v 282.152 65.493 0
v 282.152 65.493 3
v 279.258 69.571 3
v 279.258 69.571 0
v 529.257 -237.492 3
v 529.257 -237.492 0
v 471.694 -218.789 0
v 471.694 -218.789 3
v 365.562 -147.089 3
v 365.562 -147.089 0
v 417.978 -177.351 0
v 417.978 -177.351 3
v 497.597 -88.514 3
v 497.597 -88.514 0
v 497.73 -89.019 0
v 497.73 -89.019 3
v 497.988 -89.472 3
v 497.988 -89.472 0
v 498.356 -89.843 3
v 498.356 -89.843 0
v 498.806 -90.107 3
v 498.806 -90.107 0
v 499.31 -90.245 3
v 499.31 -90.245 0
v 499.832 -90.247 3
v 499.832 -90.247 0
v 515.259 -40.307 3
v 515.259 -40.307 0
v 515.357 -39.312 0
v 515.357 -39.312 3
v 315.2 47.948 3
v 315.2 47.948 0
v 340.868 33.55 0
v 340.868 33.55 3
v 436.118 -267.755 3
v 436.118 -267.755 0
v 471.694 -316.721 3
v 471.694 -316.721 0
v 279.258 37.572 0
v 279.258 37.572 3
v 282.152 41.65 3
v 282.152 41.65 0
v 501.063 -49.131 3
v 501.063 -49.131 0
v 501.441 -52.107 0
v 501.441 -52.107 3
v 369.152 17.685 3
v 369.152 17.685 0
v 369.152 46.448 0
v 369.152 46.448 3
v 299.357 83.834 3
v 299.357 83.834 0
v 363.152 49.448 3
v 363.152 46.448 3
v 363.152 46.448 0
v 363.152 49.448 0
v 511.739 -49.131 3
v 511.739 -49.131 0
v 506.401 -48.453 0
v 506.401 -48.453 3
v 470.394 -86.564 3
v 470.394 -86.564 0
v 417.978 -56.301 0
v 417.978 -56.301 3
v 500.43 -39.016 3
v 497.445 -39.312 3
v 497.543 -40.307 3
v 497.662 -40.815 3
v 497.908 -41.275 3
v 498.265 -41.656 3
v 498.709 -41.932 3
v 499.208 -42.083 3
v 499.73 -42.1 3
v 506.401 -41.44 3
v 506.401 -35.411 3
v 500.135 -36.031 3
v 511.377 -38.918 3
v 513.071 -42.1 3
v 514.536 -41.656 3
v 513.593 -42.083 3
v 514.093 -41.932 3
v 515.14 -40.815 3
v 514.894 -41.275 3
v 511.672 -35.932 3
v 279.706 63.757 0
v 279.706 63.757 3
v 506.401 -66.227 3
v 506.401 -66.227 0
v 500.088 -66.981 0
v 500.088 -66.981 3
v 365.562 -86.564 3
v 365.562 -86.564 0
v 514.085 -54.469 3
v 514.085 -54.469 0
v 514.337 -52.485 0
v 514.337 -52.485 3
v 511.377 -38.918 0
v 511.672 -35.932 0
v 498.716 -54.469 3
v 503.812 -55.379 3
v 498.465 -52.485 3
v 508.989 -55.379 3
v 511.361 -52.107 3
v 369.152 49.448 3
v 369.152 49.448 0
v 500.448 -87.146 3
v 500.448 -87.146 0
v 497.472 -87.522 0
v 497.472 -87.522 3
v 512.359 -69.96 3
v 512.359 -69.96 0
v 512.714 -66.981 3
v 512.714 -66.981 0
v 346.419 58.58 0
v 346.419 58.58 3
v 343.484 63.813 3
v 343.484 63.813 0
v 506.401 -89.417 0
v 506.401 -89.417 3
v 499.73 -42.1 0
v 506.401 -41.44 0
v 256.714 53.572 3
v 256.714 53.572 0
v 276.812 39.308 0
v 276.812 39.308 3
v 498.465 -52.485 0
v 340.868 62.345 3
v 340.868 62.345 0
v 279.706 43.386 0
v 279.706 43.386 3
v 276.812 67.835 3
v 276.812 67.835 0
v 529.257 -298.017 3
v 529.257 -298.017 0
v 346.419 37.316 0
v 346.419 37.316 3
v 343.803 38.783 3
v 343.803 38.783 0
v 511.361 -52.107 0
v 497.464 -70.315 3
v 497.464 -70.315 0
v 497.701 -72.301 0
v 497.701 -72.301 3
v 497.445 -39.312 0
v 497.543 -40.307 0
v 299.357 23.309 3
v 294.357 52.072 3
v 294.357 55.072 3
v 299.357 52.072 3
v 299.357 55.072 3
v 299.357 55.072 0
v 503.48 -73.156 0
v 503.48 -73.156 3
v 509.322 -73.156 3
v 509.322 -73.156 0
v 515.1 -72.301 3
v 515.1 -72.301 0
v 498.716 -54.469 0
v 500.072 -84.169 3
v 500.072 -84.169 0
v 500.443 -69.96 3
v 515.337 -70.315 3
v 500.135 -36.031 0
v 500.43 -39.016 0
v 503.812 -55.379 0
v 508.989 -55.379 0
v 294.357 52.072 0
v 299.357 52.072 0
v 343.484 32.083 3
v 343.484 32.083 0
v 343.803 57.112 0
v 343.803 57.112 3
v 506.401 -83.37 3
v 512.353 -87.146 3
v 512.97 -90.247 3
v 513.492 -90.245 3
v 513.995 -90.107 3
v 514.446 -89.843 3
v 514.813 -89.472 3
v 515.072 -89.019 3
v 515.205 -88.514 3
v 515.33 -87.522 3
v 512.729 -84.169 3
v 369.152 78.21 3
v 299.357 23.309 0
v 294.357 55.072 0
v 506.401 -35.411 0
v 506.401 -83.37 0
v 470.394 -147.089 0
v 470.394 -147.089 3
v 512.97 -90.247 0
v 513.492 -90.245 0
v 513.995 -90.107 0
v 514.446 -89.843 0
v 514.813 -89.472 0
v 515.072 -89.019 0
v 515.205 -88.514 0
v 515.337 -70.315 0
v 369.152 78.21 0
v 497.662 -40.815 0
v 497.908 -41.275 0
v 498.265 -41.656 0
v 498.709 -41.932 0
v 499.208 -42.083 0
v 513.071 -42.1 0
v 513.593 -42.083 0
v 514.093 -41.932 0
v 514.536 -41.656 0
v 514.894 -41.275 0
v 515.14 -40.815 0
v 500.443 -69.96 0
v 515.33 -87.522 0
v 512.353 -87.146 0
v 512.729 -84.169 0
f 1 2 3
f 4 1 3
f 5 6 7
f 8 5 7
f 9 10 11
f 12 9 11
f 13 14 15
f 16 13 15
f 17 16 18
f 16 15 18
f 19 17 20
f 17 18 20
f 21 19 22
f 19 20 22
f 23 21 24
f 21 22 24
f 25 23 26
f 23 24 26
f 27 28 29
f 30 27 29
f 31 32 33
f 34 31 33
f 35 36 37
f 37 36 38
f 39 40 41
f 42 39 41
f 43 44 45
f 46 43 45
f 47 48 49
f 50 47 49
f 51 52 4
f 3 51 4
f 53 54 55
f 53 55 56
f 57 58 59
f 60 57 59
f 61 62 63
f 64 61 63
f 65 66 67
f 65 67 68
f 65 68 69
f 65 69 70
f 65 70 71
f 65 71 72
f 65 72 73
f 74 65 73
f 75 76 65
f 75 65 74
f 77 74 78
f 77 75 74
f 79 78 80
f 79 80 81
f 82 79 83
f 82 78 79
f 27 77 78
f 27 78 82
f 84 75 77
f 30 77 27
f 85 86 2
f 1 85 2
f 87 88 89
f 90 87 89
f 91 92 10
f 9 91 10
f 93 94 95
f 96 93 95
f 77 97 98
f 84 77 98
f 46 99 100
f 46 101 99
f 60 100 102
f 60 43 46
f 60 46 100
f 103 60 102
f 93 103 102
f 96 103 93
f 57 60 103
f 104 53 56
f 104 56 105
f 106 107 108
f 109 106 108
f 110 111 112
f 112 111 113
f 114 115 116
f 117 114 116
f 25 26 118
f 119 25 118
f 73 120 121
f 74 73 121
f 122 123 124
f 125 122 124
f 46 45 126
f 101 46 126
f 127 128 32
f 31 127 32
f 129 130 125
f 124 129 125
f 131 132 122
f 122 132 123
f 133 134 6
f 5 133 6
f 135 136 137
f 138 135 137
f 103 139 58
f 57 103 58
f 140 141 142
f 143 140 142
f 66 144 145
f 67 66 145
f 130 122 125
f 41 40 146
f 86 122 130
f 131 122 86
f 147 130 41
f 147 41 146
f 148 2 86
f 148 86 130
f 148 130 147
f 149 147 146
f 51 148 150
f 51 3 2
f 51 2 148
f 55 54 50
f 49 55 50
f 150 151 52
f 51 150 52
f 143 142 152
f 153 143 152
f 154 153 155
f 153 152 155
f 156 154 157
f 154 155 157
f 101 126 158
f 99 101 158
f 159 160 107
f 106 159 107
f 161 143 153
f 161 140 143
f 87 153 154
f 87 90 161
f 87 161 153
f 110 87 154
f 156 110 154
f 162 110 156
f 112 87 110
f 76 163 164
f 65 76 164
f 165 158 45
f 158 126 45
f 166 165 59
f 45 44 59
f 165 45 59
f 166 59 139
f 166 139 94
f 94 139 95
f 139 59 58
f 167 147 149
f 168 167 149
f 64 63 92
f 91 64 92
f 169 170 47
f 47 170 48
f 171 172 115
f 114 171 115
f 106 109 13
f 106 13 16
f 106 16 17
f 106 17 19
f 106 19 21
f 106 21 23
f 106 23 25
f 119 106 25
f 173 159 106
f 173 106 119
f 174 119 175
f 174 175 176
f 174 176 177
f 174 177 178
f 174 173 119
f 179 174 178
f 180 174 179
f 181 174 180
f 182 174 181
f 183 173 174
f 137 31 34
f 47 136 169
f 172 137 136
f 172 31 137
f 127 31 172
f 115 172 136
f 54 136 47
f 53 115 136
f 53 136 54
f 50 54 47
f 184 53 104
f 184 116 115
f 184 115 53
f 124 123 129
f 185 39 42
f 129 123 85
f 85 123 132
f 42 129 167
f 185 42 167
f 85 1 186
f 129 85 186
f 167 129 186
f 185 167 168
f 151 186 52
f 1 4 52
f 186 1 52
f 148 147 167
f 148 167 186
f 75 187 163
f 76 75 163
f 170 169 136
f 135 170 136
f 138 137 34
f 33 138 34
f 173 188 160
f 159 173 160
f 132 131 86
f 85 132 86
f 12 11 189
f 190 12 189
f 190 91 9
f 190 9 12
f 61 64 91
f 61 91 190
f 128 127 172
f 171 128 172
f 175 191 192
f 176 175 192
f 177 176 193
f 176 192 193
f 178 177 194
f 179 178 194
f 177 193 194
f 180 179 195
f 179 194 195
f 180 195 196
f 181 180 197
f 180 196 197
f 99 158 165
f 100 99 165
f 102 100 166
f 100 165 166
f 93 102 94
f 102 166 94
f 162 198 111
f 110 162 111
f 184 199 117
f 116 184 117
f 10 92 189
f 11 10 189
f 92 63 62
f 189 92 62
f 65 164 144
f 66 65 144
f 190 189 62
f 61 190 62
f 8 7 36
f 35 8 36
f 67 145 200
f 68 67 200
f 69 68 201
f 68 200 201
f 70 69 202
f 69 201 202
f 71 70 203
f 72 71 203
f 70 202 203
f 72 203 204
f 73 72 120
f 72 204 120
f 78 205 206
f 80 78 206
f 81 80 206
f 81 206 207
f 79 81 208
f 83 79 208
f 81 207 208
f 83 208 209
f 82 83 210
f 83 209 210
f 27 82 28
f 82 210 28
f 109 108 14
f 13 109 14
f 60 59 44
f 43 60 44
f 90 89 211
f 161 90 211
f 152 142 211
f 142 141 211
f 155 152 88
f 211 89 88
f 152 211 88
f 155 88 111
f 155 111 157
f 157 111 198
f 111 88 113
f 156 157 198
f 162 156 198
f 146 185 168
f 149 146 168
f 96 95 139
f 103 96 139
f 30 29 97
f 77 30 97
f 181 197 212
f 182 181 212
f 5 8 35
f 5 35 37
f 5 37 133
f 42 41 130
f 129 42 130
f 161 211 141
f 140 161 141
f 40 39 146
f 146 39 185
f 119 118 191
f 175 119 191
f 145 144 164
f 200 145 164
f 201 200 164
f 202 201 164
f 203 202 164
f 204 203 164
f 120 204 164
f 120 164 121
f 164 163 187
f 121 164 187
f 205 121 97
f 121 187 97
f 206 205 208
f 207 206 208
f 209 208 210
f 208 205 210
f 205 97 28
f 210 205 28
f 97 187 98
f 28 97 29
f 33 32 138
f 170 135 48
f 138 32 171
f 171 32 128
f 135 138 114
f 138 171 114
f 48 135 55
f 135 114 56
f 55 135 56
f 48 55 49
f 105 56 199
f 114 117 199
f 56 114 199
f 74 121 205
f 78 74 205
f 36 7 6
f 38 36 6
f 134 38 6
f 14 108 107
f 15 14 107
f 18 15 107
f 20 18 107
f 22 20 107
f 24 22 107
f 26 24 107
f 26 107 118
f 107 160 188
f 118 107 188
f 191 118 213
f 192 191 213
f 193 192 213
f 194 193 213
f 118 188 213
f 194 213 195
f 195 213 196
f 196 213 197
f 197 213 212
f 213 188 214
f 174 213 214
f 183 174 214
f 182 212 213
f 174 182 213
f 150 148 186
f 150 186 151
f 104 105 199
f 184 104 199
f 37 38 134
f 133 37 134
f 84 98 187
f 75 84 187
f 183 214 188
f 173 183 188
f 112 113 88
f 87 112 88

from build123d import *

# Parameters (mm, degrees)
F4_DEPTH = 3
F5_W     = 5
F5_H     = 3
F5_W_2   = 6
F6_DEPTH = 25


with BuildPart() as f4:
    # F3 (on Top) → F4 (new body)
    with BuildSketch(Plane.XY):
        Polygon((470.3941613828, -147.0885653714), (470.3941613828, -86.5635653714), (417.9779738188, -56.3010653714), (365.5617862547, -86.5635653714), (365.5617862547, -147.0885653714), (417.9779738188, -177.3510653714), align=None)
    extrude(amount=F4_DEPTH)


with BuildPart() as f4b:
    # F3 (on Top) → F4, piece 2 (new body)
    with BuildSketch(Plane.XY):
        Polygon((529.2567662146, -298.0174807028), (529.2567662146, -237.4924807028), (471.6940705658, -218.7892271182), (436.1183681708, -267.7549807028), (471.6940705658, -316.7207342873), align=None)
    extrude(amount=F4_DEPTH)


with BuildPart() as f4c:
    # F3 (on Top) → F4, piece 3 (new body)
    with BuildSketch(Plane.XY):
        Polygon((256.7136692096, 53.5715939384), (299.3566662168, 23.3090939384), (299.3566662168, 83.8340939384), align=None)
    extrude(amount=F4_DEPTH)


with BuildPart() as f4d:
    # F3 (on Top) → F4, piece 4 (new body)
    with BuildSketch(Plane.XY):
        Polygon((369.1518926518, 17.6854150152), (369.1518926518, 78.2104150152), (315.1996851552, 47.9479150152), align=None)
    extrude(amount=F4_DEPTH)


with BuildPart() as f4e:
    # F3 (on Top) → F4, piece 5 (new body)
    with BuildSketch(Plane.XY):
        with BuildLine():
            Line((499.7301674728, -42.1000808495), (506.4008064333, -41.4401412806))
            Line((506.4008064333, -41.4401412806), (513.0714453939, -42.1000808495))
            ThreePointArc((513.0714453939, -42.1000808495), (514.536459987, -41.6563714939), (515.2586318461, -40.3066998462))
            Line((515.2586318461, -40.3066998462), (515.3570832084, -39.3115579823))
            Line((515.3570832084, -39.3115579823), (511.3765157528, -38.9177525334))
            Line((511.3765157528, -38.9177525334), (511.6718698395, -35.9323269417))
            Line((511.6718698395, -35.9323269417), (506.4008064333, -35.4108501637))
            Line((506.4008064333, -35.4108501637), (500.1346011633, -36.0307783039))
            Line((500.1346011633, -36.0307783039), (500.42995525, -39.0162038956))
            Line((500.42995525, -39.0162038956), (497.4445296583, -39.3115579823))
            Line((497.4445296583, -39.3115579823), (497.5429810205, -40.3066998462))
            ThreePointArc((497.5429810205, -40.3066998462), (498.2651528796, -41.6563714939), (499.7301674728, -42.1000808495))
        make_face()
    extrude(amount=F4_DEPTH)


with BuildPart() as f4f:
    # F3 (on Top) → F4, piece 6 (new body)
    with BuildSketch(Plane.XY):
        with BuildLine():
            Line((514.0852315523, -54.4689418778), (506.4008064333, -53.4934037976))
            Line((506.4008064333, -53.4934037976), (498.7163813144, -54.4689418778))
            ThreePointArc((498.7163813144, -54.4689418778), (506.4008064333, -55.4934037976), (514.0852315523, -54.4689418778))
        make_face()
        Polygon((498.7163813144, -54.4689418778), (506.4008064333, -53.4934037976), (514.0852315523, -54.4689418778), (514.3371100693, -52.4848659688), (511.3609962058, -52.1070481933), (511.7388139814, -49.1309343298), (506.4008064333, -48.4532740552), (501.0627988853, -49.1309343298), (501.4406166609, -52.1070481933), (498.4645027974, -52.4848659688), align=None)
    extrude(amount=F4_DEPTH)


with BuildPart() as f4g:
    # F3 (on Top) → F4, piece 7 (new body)
    with BuildSketch(Plane.XY):
        with BuildLine():
            Line((515.1004217371, -72.3010336354), (506.4008064333, -71.2628973283))
            Line((506.4008064333, -71.2628973283), (497.7011911296, -72.3010336354))
            ThreePointArc((497.7011911296, -72.3010336354), (506.4008064333, -73.2628973283), (515.1004217371, -72.3010336354))
        make_face()
        Polygon((497.7011911296, -72.3010336354), (506.4008064333, -71.2628973283), (515.1004217371, -72.3010336354), (515.337402978, -70.3151232921), (512.3585374631, -69.9596514308), (512.7140093245, -66.9807859159), (506.4008064333, -66.2274232779), (500.0876035422, -66.9807859159), (500.4430754036, -69.9596514308), (497.4642098887, -70.3151232921), align=None)
    extrude(amount=F4_DEPTH)


with BuildPart() as f4h:
    # F3 (on Top) → F4, piece 8 (new body)
    with BuildSketch(Plane.XY):
        with BuildLine():
            Line((499.8320032248, -90.2472541053), (506.4008064333, -89.4174212789))
            Line((506.4008064333, -89.4174212789), (512.9696096418, -90.2472541053))
            ThreePointArc((512.9696096418, -90.2472541053), (514.4460902163, -89.8433347274), (515.2045055116, -88.5136911698))
            Line((515.2045055116, -88.5136911698), (515.3298387452, -87.5215764685))
            Line((515.3298387452, -87.5215764685), (512.3534946412, -87.1455767678))
            Line((512.3534946412, -87.1455767678), (512.7294943419, -84.1692326639))
            Line((512.7294943419, -84.1692326639), (506.4008064333, -83.369733454))
            Line((506.4008064333, -83.369733454), (500.0721185248, -84.1692326639))
            Line((500.0721185248, -84.1692326639), (500.4481182255, -87.1455767678))
            Line((500.4481182255, -87.1455767678), (497.4717741215, -87.5215764685))
            Line((497.4717741215, -87.5215764685), (497.5971073551, -88.5136911698))
            ThreePointArc((497.5971073551, -88.5136911698), (498.3555226504, -89.8433347274), (499.8320032248, -90.2472541053))
        make_face()
    extrude(amount=F4_DEPTH)


with BuildPart() as f6_tool:
    # F5 (on face) → F6 (new body)
    with BuildSketch(Plane.XY.offset(3)):
        with Locations((296.8566662168, 53.5715939384)):
            Rectangle(F5_W, F5_H)
        Polygon((282.1521498419, 65.4934112546), (279.2584321139, 69.5709592568), (276.8119033125, 67.83472862), (279.7056210406, 63.7571806178), align=None)
        Polygon((279.7056210406, 43.386007259), (276.8119033125, 39.3084592568), (279.2584321139, 37.57222862), (282.1521498419, 41.6497766222), align=None)
        with Locations((366.1518926518, 47.9479150152)):
            Rectangle(F5_W_2, F5_H)
        Polygon((346.4192953898, 58.5799814559), (343.4840383578, 63.8129792732), (340.8675394492, 62.3453507572), (343.8027964812, 57.1123529399), align=None)
        Polygon((343.8027964812, 38.7834770905), (340.8675394492, 33.5504792732), (343.4840383578, 32.0828507572), (346.4192953898, 37.3158485745), align=None)
    extrude(amount=-F6_DEPTH)


with BuildPart() as f4c_1:
    add(f4c.part)

    # F6: cut by f6_tool
    add(f6_tool.part, mode=Mode.SUBTRACT)


with BuildPart() as f4d_1:
    add(f4d.part)

    # F6: cut by f6_tool
    add(f6_tool.part, mode=Mode.SUBTRACT)


solid = Compound([f4.part, f4b.part, f4e.part, f4f.part, f4g.part, f4h.part, f4c_1.part, f4d_1.part])
